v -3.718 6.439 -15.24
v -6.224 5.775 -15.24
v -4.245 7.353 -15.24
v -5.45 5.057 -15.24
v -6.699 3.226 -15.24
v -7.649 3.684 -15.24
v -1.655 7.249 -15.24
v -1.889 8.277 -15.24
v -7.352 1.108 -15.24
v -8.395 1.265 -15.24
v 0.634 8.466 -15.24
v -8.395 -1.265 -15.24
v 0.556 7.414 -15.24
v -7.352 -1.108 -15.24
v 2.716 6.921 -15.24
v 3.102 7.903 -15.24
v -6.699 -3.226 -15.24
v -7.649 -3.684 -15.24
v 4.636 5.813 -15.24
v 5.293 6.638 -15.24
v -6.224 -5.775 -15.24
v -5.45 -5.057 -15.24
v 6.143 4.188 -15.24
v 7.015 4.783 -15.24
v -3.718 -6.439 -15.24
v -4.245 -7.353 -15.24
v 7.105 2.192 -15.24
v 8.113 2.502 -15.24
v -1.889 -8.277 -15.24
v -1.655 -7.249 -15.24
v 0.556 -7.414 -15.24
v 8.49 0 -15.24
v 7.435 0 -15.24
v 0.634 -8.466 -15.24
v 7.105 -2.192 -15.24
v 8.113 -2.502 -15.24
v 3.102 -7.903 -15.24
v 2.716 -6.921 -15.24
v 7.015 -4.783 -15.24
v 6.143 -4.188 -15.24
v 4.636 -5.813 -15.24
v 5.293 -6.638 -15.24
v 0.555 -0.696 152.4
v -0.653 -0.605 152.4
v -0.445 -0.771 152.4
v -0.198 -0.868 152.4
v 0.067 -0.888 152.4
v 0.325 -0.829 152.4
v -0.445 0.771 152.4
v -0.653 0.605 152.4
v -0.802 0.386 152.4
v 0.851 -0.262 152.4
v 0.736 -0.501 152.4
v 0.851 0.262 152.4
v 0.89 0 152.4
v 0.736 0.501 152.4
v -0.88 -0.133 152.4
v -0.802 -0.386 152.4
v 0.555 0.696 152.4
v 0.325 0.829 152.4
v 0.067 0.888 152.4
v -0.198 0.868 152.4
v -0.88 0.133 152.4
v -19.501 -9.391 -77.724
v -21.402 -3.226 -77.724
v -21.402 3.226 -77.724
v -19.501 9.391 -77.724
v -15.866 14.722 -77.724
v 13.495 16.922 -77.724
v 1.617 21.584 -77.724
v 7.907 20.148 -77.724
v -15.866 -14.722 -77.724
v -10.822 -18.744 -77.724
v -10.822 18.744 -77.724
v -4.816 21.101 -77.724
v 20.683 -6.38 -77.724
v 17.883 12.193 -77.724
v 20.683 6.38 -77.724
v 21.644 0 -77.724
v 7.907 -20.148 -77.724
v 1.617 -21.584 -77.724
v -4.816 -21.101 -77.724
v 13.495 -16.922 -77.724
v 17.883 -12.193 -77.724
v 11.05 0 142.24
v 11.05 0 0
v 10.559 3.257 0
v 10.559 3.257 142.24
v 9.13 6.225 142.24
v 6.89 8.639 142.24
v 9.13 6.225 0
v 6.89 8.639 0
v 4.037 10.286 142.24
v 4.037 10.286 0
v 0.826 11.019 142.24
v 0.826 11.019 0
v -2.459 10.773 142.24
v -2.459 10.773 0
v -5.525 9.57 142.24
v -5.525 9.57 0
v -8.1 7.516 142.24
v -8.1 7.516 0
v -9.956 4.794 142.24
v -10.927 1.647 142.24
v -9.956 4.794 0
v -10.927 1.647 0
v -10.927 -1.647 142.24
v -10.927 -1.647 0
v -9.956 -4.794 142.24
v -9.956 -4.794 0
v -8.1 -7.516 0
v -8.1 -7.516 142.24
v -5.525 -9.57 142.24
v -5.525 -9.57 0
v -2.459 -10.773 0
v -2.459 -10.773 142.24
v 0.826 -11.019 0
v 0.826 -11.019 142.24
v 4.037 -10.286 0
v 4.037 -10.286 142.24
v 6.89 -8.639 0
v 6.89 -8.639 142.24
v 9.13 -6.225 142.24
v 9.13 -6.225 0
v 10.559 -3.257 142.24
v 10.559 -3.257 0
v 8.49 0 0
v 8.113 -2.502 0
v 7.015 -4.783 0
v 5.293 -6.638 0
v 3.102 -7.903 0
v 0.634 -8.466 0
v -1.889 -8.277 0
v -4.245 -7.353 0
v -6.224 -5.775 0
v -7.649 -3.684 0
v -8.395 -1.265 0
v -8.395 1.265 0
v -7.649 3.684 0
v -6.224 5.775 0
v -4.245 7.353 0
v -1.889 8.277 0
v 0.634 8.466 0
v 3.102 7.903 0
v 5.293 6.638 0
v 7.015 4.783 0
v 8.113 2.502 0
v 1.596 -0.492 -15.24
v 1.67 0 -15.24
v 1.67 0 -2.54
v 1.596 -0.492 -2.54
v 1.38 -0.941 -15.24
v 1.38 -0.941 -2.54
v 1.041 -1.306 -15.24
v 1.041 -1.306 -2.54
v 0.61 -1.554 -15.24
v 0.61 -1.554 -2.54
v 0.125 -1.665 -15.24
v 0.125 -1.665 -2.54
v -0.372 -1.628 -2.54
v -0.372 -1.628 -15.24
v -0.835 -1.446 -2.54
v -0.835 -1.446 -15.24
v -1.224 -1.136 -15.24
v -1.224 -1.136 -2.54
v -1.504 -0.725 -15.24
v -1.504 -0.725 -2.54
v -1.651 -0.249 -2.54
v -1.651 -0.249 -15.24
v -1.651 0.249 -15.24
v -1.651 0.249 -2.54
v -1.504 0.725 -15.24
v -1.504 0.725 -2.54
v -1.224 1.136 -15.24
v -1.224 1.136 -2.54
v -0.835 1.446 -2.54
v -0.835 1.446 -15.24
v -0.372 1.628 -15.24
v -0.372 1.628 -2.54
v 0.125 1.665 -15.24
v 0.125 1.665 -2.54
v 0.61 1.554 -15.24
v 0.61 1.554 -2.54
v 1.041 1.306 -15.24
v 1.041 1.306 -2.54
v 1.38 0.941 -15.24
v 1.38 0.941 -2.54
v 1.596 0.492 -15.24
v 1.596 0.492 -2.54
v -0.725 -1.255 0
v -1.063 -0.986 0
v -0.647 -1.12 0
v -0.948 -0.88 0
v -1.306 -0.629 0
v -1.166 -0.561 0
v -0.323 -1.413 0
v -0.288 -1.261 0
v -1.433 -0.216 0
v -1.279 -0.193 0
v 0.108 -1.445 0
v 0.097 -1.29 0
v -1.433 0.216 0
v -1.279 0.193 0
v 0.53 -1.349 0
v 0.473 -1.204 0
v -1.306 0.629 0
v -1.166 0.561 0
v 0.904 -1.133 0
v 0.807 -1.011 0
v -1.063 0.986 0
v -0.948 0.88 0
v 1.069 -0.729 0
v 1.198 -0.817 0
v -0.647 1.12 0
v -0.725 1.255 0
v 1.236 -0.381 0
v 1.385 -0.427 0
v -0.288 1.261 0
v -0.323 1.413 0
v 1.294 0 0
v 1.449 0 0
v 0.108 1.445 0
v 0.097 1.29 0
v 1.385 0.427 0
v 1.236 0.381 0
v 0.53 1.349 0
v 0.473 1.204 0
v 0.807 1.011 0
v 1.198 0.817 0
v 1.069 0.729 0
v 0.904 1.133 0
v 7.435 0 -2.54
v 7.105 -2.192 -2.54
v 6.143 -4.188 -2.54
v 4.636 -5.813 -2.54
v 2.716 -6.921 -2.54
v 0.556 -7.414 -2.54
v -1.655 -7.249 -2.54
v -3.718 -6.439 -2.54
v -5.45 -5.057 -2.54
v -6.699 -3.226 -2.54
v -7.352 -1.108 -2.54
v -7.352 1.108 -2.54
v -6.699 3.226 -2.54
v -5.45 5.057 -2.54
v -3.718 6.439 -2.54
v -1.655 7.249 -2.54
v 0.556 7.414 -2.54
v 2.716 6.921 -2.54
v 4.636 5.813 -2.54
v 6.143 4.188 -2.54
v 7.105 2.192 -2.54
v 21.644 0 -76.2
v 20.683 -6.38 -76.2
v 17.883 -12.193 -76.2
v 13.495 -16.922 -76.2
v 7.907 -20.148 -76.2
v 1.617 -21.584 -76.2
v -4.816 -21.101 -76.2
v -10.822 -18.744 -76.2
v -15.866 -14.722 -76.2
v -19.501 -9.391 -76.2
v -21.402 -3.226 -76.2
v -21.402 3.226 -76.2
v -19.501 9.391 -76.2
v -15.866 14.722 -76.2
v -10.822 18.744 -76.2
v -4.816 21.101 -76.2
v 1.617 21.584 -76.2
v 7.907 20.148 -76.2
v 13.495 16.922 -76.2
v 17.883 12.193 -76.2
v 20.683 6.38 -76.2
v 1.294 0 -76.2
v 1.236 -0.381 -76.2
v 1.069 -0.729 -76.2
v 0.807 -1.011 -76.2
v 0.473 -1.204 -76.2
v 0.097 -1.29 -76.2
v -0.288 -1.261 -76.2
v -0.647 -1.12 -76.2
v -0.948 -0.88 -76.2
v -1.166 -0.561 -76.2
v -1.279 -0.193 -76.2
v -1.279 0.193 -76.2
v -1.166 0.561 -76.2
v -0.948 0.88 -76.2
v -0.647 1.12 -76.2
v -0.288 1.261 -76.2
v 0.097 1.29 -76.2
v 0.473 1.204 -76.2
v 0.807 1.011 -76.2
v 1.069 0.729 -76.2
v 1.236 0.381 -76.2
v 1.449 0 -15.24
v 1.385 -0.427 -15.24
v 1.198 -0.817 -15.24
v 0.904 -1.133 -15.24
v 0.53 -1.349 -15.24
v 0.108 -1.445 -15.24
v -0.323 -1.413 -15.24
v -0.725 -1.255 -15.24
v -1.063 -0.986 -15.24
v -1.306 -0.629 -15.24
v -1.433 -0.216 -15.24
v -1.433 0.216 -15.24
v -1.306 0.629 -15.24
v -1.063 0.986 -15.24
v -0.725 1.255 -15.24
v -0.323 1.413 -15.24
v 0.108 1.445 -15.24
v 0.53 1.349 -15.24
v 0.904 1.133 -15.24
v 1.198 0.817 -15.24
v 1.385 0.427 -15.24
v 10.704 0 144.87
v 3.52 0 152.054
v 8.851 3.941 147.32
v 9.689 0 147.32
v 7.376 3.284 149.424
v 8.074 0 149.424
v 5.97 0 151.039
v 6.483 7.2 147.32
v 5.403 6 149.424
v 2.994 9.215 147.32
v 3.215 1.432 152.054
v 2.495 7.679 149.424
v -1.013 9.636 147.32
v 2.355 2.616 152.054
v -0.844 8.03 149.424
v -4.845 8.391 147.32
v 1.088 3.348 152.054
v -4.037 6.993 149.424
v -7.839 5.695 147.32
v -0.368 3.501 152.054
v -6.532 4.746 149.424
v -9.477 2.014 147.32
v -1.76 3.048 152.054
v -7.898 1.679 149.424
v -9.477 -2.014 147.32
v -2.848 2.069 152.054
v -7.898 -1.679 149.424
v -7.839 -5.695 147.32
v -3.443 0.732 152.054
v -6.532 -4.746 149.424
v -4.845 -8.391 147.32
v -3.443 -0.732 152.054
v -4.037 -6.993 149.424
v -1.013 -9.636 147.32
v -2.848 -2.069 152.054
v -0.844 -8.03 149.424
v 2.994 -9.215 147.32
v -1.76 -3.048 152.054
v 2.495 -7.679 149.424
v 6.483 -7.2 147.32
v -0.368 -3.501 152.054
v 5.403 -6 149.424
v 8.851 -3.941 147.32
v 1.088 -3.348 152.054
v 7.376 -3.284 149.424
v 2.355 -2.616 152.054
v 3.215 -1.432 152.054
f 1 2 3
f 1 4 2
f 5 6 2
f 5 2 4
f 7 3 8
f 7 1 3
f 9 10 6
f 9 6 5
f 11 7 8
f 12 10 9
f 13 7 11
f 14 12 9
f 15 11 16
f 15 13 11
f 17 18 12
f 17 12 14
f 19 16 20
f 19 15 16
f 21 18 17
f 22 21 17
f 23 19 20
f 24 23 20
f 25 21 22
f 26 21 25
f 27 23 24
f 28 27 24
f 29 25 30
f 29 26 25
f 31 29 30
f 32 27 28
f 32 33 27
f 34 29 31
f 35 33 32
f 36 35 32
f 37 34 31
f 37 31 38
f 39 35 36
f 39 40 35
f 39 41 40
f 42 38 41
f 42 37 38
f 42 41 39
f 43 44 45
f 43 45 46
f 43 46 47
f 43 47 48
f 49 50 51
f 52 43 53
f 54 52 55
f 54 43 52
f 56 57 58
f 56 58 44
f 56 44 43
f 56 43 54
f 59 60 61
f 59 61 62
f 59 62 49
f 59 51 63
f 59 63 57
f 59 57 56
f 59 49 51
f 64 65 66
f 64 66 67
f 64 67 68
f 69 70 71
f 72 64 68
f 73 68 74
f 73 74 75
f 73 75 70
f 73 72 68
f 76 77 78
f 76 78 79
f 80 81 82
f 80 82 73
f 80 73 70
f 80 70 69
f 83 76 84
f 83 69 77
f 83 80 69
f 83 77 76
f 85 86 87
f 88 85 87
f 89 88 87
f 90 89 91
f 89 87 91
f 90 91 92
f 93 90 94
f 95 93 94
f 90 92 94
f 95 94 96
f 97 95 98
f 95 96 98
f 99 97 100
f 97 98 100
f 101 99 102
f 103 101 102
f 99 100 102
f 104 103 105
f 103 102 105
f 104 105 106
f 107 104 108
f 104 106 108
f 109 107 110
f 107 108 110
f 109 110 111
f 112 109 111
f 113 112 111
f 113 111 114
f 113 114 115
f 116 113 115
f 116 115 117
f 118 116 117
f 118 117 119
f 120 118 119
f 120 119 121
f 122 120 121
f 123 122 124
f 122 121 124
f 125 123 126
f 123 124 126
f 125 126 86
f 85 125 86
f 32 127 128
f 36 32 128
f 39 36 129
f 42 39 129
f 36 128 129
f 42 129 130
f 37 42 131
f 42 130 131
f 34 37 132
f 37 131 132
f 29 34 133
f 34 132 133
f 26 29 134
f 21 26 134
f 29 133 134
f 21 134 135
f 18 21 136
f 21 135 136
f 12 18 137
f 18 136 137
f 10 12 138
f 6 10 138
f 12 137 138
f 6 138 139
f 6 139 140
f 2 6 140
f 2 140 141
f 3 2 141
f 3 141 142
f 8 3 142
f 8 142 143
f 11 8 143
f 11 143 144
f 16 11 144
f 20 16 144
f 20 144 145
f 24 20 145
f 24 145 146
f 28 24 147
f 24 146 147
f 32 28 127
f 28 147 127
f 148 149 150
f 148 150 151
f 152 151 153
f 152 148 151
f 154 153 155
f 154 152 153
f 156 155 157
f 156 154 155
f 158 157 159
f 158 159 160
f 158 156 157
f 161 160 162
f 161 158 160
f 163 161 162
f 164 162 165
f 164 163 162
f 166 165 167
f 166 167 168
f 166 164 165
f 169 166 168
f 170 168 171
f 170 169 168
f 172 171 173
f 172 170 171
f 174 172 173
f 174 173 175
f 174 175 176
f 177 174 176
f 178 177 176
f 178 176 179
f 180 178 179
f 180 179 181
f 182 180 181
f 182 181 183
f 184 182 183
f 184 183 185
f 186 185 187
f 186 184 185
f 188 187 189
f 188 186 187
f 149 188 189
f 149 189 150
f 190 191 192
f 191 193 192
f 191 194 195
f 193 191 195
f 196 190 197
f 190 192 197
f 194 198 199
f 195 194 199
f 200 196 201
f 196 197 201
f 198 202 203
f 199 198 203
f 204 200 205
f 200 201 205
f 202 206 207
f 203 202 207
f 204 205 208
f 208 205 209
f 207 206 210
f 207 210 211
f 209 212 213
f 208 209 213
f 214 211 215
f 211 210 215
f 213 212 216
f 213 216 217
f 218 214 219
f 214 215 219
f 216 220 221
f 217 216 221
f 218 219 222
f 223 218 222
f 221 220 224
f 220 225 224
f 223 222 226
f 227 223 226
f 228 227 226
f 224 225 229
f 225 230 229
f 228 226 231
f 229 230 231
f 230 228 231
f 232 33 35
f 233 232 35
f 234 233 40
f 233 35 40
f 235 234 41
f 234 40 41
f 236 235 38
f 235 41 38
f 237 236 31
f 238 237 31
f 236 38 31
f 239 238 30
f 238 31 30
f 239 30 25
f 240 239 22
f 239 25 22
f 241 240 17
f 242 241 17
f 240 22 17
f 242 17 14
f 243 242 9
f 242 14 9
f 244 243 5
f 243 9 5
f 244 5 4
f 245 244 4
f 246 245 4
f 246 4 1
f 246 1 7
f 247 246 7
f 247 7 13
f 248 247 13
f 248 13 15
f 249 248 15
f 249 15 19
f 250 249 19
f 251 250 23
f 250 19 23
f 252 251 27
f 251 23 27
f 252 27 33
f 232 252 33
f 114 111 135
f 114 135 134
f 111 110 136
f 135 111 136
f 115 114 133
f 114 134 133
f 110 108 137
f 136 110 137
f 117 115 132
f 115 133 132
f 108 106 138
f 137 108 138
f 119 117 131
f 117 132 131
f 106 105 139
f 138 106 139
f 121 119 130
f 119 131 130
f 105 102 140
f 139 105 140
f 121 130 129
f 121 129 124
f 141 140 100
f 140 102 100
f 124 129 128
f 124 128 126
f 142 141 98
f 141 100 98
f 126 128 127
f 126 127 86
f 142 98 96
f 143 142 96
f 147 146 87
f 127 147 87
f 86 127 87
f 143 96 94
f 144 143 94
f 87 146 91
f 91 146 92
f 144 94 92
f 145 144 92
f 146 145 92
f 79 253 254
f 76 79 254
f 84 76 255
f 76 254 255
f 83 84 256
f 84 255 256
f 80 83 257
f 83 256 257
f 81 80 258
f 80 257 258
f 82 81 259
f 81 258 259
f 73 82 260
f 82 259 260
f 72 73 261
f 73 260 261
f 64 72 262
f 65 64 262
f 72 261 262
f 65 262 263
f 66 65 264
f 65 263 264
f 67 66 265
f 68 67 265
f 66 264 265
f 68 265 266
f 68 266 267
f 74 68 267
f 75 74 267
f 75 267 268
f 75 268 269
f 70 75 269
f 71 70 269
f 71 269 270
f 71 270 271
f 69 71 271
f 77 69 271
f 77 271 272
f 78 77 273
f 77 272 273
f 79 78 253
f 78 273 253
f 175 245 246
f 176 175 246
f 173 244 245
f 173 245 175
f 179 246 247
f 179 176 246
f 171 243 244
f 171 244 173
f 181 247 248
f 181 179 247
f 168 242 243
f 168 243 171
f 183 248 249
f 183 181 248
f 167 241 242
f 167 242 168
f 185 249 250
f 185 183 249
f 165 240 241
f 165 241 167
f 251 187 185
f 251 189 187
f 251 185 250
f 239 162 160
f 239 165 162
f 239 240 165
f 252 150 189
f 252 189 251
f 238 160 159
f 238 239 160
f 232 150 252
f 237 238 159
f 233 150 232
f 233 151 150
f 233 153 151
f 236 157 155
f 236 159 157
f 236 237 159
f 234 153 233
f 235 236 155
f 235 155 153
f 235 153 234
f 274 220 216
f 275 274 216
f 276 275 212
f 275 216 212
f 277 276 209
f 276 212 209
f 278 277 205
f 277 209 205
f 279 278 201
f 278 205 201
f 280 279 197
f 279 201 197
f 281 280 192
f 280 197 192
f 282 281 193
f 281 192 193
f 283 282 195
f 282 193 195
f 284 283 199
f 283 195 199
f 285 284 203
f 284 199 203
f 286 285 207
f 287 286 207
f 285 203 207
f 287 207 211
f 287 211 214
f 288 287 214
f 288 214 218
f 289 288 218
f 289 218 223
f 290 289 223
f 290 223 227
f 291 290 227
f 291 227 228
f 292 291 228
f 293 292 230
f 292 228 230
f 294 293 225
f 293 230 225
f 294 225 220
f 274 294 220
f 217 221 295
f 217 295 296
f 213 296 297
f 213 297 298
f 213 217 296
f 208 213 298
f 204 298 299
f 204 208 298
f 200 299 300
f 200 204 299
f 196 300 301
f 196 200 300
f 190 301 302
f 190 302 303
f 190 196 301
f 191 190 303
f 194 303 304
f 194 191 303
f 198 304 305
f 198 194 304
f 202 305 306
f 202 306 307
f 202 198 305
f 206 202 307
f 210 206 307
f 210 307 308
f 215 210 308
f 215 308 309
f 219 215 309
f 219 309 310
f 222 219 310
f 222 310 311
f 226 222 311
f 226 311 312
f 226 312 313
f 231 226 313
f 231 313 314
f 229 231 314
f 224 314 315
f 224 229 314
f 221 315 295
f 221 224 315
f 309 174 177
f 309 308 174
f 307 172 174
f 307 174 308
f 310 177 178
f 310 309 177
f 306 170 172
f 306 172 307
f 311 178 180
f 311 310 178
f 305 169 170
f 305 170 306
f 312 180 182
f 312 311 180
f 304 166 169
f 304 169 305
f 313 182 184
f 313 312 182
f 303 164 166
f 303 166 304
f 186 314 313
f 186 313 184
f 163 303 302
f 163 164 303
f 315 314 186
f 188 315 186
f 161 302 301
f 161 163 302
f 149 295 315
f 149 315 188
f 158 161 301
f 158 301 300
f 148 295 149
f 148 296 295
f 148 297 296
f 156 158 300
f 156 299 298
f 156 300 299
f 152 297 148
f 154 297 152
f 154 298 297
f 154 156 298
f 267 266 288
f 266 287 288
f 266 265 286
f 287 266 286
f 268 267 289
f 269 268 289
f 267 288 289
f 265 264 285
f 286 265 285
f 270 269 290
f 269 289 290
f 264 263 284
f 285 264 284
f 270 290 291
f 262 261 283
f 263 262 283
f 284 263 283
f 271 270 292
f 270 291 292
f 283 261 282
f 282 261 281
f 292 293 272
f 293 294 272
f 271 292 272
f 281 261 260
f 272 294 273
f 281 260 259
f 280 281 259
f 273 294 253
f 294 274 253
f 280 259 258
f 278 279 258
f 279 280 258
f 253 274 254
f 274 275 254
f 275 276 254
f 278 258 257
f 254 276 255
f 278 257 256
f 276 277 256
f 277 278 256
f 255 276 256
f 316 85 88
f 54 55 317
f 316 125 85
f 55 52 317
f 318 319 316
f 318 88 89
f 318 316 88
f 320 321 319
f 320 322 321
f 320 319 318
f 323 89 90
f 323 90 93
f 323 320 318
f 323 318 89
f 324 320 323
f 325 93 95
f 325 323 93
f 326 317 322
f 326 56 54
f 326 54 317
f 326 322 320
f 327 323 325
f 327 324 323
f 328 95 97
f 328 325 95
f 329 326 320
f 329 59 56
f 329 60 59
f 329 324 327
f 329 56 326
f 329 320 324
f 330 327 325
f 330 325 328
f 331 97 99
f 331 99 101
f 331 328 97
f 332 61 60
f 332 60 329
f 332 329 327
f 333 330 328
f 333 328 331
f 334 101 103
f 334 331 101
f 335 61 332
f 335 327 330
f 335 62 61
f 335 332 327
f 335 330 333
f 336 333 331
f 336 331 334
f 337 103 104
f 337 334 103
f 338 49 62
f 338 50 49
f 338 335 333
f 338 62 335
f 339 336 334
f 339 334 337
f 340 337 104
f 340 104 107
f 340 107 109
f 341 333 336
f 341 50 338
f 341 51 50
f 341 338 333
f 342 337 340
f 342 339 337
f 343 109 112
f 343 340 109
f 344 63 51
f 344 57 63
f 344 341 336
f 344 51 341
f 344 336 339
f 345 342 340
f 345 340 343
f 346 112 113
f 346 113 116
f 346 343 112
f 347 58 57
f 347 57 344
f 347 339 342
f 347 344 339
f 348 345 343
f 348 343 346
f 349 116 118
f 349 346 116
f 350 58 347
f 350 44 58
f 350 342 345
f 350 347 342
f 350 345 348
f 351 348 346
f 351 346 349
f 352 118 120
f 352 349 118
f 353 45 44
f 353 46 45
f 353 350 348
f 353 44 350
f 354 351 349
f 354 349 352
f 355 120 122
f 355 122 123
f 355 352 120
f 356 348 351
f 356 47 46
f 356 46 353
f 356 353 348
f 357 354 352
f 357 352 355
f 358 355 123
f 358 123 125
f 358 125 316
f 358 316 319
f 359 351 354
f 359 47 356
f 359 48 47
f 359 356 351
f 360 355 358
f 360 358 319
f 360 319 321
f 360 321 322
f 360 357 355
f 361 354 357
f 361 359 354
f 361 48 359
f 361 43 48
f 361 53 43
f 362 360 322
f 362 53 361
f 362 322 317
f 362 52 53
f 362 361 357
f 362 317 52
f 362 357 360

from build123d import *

# Parameters (mm, degrees)
F0_R      = 11.050187
F1_DEPTH  = 152.4
F2_R      = 10.16
F3_R      = 1.293734
F4_DEPTH  = 76.2
F5_R      = 8.49004
F5_R_2    = 1.449468
F6_DEPTH  = 15.24
F7_R      = 7.435283
F7_R_2    = 1.669858
F8_DEPTH  = 12.7
F9_R      = 21.64415
F10_DEPTH = 1.524


with BuildPart() as f1:
    # F0 (on Top) → F1 (new body)
    with BuildSketch(Plane.XY):
        Circle(F0_R)
    extrude(amount=F1_DEPTH)

    # F2
    f2_edges = [f1.edges().sort_by_distance(p)[0] for p in [
        (-11.050187, 0, 152.4),
    ]]
    fillet(f2_edges, radius=F2_R)

    # F3 (on face) → F4 (join)
    with BuildSketch(Plane(origin=(0, 0, 0), x_dir=(1, 0, 0), z_dir=(0, 0, -1))):
        Circle(F3_R)
    extrude(amount=F4_DEPTH)

    # F5 (on face) → F6 (join)
    with BuildSketch(Plane(origin=(0, 0, 0), x_dir=(1, 0, 0), z_dir=(0, 0, -1))):
        Circle(F5_R)
        Circle(F5_R_2, mode=Mode.SUBTRACT)
    extrude(amount=F6_DEPTH)

    # F7 (on face) → F8 (cut)
    with BuildSketch(Plane(origin=(0, 0, -15.24), x_dir=(1, 0, 0), z_dir=(0, 0, -1))):
        Circle(F7_R)
        Circle(F7_R_2, mode=Mode.SUBTRACT)
    extrude(amount=-F8_DEPTH, mode=Mode.SUBTRACT)

    # F9 (on face) → F10 (join)
    with BuildSketch(Plane(origin=(0, 0, -76.2), x_dir=(1, 0, 0), z_dir=(0, 0, -1))):
        Circle(F9_R)
    extrude(amount=F10_DEPTH)


solid = f1.part
